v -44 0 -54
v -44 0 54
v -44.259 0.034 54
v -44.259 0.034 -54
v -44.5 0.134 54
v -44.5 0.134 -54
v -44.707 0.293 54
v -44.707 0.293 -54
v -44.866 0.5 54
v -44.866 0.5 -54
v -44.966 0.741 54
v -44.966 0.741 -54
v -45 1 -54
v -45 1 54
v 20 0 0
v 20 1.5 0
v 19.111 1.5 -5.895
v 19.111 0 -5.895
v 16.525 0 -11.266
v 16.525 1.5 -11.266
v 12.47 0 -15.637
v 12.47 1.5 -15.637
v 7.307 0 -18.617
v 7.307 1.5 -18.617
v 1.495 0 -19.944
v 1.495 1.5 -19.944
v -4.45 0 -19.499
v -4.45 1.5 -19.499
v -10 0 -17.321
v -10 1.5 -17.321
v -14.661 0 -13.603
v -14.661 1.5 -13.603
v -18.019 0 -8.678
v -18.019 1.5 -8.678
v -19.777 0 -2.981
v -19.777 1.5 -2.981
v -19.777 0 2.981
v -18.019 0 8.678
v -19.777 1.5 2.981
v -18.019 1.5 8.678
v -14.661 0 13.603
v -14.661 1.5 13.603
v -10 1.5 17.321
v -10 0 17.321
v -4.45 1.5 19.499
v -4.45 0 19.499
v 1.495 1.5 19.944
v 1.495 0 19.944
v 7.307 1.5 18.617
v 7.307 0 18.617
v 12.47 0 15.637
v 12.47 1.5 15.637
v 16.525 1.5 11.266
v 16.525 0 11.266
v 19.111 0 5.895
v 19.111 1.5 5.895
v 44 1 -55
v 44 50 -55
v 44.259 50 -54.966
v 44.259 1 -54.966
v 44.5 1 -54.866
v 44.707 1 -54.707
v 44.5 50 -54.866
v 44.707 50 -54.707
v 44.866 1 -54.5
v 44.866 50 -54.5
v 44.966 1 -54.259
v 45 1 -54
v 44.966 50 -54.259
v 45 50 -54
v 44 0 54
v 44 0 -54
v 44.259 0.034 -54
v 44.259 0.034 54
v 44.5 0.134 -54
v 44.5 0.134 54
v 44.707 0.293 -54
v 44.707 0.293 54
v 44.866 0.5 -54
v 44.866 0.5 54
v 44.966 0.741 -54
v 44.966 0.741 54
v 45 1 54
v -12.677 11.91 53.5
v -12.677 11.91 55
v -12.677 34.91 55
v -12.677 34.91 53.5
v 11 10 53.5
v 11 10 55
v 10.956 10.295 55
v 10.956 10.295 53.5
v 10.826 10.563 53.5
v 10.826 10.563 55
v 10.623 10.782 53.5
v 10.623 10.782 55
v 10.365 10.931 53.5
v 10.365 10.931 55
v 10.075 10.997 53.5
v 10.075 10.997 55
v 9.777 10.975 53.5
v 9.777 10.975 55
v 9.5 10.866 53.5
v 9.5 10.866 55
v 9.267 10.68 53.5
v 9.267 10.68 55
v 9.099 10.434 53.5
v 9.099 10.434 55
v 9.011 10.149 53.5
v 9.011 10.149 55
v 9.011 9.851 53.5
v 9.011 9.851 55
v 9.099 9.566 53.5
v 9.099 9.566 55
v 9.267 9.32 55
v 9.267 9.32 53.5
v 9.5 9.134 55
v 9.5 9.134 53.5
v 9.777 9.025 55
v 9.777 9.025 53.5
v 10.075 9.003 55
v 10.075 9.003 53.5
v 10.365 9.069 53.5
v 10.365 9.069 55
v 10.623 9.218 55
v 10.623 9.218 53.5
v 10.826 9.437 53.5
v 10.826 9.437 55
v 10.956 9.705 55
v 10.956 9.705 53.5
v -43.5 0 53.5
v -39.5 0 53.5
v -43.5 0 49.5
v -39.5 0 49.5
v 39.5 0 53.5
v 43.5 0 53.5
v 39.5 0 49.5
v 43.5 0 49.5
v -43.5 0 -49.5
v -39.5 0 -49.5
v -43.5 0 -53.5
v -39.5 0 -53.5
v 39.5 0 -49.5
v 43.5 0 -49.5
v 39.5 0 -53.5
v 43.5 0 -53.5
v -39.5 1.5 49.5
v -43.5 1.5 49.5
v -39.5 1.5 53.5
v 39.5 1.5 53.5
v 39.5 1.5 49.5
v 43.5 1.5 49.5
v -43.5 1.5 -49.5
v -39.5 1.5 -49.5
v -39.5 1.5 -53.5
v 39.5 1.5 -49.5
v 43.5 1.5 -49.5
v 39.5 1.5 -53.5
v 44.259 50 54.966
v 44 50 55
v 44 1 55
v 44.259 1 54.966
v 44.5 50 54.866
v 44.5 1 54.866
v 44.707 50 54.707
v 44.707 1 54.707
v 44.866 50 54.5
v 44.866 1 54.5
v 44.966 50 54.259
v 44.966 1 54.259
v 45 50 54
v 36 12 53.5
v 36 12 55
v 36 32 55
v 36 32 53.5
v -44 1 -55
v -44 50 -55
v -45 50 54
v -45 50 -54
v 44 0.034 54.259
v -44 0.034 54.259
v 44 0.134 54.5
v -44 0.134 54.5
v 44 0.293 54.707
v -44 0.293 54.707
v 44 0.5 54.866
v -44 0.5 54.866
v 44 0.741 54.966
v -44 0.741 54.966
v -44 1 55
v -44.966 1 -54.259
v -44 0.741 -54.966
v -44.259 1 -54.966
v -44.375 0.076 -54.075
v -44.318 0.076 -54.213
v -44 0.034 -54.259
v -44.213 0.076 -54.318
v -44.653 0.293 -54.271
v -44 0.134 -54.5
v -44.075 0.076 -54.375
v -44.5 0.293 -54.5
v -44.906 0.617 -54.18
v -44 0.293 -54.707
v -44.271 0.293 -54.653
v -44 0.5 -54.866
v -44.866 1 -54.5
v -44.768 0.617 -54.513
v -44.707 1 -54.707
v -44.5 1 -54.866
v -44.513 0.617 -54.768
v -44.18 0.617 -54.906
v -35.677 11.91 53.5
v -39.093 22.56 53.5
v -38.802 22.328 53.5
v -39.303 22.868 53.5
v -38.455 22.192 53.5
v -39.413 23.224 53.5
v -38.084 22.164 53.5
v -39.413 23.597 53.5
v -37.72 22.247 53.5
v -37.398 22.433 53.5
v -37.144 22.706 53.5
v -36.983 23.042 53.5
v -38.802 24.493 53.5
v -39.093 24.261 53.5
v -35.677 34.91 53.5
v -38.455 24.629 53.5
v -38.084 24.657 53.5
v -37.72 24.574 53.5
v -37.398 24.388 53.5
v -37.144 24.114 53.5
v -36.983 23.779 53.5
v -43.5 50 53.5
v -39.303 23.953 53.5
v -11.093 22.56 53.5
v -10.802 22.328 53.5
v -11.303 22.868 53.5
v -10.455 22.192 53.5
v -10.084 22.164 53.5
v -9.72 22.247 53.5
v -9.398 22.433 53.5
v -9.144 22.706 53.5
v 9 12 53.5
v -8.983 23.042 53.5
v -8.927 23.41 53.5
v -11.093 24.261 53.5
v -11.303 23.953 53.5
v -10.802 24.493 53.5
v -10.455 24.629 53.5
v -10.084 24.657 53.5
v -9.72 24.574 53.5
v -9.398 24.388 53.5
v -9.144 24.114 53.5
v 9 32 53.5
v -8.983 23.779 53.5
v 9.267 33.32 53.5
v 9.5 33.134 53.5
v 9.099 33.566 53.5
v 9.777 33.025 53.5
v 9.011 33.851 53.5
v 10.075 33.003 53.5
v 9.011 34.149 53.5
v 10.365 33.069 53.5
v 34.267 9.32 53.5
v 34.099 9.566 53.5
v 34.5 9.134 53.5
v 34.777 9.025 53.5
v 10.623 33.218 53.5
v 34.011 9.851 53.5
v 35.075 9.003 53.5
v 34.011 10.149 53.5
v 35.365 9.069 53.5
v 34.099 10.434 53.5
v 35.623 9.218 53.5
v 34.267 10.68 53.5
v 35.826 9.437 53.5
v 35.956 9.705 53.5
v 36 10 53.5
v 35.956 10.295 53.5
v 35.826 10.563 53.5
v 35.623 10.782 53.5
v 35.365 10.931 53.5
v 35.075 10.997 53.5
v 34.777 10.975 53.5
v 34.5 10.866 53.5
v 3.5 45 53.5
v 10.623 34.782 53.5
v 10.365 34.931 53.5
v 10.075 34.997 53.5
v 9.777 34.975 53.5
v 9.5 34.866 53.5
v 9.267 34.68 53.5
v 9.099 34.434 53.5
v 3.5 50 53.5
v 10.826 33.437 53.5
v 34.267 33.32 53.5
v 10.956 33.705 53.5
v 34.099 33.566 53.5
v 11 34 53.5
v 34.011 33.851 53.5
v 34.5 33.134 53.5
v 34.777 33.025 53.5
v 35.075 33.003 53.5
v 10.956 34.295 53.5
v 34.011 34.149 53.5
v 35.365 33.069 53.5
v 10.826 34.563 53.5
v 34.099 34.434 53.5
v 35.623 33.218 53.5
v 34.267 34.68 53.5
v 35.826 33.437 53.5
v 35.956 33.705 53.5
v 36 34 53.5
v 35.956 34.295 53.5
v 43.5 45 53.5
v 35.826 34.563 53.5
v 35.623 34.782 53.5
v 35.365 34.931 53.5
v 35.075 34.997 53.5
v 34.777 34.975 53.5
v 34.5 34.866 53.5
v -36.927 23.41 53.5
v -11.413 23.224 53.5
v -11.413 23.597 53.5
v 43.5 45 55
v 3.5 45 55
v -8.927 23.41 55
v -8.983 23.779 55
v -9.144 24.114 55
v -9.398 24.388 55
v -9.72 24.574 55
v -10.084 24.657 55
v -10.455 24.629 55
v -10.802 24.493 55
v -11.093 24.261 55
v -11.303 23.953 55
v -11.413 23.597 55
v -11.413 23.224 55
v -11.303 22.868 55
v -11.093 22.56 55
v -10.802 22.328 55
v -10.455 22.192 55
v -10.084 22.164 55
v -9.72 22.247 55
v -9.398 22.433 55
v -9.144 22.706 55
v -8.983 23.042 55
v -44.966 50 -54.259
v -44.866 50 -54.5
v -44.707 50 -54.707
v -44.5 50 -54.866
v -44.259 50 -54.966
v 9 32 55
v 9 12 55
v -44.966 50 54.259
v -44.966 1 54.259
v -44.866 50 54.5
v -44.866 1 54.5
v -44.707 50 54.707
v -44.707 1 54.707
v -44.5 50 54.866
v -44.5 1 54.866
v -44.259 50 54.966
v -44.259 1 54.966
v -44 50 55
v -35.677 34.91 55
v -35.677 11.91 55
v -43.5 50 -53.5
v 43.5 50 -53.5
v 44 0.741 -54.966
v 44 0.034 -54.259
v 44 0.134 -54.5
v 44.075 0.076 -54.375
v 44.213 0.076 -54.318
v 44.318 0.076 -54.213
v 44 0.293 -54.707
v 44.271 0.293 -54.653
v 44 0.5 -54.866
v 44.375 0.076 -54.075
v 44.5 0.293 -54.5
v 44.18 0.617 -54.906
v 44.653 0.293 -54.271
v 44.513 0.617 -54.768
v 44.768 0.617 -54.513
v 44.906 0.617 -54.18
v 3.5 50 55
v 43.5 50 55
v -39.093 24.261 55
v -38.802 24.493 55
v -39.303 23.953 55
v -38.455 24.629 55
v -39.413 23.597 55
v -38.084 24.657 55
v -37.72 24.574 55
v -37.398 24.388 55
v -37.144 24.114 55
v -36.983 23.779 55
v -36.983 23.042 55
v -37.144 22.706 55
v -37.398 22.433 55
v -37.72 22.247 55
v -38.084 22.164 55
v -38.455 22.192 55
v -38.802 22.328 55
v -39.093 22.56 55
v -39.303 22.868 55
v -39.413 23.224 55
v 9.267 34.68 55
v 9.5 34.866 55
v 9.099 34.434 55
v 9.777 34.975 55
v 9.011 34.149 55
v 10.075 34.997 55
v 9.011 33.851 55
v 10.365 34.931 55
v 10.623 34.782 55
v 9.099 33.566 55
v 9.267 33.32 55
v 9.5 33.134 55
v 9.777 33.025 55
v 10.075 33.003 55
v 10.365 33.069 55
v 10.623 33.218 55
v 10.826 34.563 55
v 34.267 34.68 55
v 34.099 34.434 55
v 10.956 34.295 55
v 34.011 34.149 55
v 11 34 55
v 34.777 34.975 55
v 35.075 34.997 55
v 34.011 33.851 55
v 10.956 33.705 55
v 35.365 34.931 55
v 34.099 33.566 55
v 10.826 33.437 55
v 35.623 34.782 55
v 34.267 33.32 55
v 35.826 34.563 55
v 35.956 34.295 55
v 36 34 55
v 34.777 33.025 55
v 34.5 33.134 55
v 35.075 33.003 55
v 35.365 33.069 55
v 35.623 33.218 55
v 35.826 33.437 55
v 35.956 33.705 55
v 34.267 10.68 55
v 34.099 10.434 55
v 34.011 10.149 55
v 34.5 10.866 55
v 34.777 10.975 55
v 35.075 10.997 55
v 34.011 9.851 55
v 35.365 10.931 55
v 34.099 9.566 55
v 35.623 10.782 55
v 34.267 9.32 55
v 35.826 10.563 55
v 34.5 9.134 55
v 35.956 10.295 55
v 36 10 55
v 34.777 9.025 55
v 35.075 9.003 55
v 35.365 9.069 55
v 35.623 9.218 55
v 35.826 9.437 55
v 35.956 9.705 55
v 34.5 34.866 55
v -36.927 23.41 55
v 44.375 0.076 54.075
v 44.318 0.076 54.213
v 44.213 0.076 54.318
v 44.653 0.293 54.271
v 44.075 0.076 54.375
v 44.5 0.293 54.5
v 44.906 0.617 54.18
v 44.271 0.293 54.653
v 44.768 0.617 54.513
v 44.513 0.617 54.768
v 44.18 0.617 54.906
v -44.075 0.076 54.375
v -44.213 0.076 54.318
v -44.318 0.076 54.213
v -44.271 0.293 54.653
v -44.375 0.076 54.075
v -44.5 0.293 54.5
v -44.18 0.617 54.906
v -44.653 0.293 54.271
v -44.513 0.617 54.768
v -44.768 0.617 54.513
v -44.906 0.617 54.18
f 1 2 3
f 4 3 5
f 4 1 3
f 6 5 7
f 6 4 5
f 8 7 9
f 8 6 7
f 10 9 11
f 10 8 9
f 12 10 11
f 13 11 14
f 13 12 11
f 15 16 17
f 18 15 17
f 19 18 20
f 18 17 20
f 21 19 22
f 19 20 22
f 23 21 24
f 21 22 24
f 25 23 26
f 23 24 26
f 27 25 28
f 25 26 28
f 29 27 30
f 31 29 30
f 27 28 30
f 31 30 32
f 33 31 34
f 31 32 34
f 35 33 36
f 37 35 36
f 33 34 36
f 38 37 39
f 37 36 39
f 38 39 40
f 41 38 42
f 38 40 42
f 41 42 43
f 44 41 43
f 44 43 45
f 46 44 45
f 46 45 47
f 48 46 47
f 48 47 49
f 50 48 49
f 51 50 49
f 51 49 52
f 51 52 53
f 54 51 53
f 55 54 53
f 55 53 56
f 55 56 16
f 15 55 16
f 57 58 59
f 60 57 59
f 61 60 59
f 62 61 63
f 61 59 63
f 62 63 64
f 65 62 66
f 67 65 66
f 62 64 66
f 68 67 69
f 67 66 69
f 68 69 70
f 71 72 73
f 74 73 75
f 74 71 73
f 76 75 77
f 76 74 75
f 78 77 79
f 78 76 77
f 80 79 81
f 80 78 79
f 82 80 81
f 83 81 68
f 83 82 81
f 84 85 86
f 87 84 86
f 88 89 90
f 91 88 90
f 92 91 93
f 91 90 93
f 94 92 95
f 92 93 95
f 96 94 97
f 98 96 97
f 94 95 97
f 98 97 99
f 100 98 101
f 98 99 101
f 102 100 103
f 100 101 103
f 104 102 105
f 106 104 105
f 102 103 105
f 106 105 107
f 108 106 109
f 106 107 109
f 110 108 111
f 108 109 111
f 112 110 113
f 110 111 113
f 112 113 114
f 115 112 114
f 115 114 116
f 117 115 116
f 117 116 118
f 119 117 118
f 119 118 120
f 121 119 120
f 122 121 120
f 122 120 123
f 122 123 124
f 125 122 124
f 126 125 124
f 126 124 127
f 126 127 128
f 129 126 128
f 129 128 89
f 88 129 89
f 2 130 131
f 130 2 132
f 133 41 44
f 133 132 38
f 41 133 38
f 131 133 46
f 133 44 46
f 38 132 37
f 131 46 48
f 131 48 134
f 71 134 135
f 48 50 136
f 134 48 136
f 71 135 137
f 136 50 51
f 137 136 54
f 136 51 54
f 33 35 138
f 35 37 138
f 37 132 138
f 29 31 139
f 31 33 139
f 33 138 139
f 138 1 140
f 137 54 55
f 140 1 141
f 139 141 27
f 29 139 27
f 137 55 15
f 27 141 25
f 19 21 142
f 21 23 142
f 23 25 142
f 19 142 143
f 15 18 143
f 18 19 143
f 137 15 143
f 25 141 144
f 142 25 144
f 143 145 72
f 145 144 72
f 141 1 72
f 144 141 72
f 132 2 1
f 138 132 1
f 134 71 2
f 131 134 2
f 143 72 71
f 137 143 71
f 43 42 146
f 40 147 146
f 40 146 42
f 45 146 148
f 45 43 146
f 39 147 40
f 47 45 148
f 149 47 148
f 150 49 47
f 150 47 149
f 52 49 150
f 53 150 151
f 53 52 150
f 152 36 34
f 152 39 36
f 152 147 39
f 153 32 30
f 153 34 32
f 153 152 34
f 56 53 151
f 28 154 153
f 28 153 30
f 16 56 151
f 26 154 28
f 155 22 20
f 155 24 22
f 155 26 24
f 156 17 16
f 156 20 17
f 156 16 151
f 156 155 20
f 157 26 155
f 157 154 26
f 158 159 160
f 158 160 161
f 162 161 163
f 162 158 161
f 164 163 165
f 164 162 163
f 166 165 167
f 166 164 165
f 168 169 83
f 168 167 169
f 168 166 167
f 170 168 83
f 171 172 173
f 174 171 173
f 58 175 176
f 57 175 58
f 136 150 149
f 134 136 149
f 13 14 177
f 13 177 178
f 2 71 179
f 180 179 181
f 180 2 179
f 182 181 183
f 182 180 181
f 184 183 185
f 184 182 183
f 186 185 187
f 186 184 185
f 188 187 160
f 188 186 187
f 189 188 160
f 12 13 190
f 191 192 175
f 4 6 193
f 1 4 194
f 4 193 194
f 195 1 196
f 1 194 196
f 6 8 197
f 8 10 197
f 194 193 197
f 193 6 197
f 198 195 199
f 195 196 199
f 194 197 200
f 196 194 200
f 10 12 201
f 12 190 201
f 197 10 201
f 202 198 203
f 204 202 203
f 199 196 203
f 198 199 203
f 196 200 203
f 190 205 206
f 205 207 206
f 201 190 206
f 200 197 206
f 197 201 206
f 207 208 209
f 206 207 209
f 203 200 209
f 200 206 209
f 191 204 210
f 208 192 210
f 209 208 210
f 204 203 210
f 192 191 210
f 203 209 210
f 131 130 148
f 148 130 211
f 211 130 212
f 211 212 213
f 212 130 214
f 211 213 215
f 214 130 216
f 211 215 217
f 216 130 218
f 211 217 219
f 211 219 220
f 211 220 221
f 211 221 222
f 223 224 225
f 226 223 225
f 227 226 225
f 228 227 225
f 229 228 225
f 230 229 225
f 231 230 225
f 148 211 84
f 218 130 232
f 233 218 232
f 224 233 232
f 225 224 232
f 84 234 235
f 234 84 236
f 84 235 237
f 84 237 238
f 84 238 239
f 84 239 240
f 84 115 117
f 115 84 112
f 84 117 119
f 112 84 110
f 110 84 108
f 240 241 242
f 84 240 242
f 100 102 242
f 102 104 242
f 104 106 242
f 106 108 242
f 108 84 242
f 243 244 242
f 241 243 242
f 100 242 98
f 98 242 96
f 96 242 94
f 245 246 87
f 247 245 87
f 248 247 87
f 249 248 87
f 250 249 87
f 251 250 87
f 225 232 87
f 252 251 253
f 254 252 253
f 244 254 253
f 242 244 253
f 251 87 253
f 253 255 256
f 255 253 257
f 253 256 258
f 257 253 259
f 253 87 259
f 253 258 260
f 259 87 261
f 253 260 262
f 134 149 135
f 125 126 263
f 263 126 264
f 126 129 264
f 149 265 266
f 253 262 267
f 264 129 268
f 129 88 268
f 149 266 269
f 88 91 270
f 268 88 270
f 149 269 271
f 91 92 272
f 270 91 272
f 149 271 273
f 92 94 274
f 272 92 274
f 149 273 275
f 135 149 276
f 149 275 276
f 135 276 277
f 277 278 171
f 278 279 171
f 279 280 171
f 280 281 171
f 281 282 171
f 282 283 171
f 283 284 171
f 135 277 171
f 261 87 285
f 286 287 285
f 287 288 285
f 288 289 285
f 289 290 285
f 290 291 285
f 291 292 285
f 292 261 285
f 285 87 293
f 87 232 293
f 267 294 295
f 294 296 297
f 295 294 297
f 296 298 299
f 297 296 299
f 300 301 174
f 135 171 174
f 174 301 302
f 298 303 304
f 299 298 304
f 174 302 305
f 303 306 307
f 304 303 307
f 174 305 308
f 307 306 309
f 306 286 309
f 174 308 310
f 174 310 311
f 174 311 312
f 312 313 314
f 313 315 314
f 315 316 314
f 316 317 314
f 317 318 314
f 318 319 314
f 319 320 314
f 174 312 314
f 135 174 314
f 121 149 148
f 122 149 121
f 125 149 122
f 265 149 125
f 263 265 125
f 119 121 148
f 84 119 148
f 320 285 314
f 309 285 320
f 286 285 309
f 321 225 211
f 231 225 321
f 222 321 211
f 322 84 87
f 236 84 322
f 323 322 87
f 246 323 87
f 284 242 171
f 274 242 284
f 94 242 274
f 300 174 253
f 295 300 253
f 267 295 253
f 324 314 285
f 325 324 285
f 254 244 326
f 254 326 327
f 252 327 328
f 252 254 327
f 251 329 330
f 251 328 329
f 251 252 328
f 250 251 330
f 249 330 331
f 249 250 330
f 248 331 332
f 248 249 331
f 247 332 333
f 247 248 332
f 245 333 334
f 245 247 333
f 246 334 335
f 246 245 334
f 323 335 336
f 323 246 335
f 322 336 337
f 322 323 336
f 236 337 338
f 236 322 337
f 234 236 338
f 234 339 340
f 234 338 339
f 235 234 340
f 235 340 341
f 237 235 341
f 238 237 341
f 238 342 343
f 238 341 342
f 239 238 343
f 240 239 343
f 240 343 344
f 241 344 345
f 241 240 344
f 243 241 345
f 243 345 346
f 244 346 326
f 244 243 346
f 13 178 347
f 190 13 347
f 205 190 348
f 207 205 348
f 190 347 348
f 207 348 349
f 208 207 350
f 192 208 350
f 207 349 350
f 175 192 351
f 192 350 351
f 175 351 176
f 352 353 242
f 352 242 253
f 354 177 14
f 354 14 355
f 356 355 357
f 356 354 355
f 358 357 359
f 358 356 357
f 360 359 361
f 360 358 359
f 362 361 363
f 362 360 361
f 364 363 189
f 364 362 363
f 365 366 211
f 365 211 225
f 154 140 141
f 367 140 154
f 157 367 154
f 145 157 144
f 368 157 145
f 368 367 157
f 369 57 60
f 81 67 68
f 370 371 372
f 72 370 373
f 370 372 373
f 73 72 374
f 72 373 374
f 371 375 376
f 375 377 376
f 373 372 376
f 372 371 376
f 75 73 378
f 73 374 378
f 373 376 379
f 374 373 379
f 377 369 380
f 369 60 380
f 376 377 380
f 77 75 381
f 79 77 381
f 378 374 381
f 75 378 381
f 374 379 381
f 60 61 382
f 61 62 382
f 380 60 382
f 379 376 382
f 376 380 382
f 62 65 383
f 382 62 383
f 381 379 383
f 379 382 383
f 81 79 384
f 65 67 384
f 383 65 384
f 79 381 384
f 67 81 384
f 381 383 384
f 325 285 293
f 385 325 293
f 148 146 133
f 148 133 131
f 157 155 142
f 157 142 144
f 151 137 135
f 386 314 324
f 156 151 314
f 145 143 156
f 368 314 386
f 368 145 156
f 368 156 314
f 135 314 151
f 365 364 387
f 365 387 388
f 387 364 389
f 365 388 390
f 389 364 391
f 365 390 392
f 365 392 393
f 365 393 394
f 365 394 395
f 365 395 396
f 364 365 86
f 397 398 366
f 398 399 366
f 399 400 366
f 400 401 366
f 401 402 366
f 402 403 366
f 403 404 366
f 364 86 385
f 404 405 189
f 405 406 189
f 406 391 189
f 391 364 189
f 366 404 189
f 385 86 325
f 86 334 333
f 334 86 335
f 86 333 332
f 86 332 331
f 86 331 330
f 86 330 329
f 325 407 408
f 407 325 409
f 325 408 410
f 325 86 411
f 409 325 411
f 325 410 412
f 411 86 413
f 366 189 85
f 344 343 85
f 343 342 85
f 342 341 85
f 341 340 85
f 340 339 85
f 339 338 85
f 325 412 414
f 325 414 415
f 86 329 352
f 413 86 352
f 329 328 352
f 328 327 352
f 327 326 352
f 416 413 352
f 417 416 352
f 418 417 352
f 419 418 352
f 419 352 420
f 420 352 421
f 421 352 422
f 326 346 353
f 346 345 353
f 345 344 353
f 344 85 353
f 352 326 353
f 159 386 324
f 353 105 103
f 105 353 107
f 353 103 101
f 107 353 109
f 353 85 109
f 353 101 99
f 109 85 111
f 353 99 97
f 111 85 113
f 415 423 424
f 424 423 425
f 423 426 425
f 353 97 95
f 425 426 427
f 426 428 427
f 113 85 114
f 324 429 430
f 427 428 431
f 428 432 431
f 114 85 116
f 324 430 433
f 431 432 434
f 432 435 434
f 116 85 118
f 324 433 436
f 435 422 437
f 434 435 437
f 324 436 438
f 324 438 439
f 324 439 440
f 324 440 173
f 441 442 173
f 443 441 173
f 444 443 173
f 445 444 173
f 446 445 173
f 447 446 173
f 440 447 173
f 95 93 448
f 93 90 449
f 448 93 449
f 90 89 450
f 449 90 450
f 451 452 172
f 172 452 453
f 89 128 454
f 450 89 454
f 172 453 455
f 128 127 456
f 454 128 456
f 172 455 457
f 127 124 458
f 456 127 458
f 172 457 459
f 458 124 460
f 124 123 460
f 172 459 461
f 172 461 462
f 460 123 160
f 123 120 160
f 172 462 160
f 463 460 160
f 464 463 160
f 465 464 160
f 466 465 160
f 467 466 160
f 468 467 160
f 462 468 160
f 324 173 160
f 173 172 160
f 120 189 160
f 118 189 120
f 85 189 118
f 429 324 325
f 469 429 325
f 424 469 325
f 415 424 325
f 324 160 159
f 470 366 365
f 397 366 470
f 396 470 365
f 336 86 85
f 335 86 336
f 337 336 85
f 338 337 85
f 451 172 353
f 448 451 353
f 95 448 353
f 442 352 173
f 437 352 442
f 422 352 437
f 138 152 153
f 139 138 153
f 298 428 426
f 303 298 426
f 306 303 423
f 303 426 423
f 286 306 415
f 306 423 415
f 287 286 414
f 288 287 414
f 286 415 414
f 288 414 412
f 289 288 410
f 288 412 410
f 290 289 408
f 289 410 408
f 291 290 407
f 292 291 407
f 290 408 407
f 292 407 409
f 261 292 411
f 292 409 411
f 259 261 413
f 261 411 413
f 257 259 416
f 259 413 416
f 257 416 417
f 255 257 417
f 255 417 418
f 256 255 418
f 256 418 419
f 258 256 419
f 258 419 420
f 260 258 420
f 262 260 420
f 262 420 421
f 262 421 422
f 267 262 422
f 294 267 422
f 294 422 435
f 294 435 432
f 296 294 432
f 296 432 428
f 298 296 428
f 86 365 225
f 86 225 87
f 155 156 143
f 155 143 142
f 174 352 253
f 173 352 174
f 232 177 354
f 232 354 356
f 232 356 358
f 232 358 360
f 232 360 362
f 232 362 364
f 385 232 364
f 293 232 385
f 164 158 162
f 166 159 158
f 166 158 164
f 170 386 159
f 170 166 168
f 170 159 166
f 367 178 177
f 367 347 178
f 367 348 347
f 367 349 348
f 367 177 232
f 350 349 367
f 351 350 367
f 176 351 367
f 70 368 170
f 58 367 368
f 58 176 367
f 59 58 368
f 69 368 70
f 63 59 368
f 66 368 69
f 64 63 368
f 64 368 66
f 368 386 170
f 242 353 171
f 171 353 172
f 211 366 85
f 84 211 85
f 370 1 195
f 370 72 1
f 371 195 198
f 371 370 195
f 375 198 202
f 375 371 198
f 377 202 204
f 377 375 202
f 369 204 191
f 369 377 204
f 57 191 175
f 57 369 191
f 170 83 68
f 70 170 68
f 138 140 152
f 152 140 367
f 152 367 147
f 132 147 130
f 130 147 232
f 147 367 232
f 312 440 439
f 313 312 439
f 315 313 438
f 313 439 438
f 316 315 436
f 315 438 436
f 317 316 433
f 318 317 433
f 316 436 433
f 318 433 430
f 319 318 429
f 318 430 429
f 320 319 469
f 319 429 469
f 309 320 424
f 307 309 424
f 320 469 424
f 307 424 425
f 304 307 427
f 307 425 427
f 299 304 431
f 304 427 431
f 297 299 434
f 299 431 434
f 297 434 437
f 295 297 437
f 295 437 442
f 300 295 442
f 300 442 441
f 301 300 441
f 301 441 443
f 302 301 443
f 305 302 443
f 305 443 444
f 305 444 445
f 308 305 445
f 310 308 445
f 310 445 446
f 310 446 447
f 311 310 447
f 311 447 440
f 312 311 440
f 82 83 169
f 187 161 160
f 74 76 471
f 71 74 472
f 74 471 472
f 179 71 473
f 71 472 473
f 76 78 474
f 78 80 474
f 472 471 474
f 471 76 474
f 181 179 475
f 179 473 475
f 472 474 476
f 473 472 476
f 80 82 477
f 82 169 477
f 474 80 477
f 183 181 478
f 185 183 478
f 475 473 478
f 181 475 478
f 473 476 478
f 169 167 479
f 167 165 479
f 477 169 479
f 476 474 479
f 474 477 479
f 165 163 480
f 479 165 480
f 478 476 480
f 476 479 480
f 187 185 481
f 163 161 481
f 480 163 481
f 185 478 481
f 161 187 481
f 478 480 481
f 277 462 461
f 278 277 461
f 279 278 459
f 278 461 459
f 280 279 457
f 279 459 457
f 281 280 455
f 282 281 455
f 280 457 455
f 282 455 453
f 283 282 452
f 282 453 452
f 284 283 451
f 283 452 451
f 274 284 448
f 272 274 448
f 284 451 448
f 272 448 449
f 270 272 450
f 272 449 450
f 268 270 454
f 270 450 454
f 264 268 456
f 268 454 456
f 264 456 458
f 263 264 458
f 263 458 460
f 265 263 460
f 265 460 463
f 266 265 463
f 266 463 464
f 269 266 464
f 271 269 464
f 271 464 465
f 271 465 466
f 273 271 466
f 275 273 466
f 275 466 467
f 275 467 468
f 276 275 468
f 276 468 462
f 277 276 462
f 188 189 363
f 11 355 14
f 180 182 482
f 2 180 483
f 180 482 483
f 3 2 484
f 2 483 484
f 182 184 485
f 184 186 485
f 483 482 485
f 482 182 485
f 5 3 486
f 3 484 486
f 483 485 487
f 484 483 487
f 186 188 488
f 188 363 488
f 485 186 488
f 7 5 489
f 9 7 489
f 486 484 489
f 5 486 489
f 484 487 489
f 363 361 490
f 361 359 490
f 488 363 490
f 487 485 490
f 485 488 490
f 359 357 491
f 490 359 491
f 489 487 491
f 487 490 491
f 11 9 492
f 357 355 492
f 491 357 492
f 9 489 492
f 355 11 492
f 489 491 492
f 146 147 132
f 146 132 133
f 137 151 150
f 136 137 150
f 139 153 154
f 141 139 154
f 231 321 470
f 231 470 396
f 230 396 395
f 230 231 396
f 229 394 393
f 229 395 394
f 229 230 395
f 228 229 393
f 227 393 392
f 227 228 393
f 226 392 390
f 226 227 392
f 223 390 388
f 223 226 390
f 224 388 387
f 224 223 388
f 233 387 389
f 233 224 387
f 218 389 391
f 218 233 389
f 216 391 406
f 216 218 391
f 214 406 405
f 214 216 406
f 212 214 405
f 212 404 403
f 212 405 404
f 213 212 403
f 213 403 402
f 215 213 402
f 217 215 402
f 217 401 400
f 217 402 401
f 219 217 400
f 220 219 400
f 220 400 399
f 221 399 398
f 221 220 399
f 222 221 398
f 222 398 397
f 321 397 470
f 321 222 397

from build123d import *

# Parameters (mm, degrees)
SKETCH_4_W               = 90
SKETCH_4_H               = 110
EXTRUDE_2_DEPTH          = 50
SHELL_2_T                = -1.5
SKETCH_5_W               = 4
SKETCH_5_H               = 4
CUT_EXTRUDE_2_DEPTH      = 50
MIRROR_5_COPY_1_SKETCH_W = 4
MIRROR_5_COPY_1_SKETCH_H = 4
MIRROR_5_COPY_1_DEPTH    = 50
SKETCH_9_R               = 20
CUT_EXTRUDE_5_DEPTH      = 50
SKETCH_12_W              = 23
SKETCH_12_H              = 23
CUT_EXTRUDE_6_DEPTH      = 50
SKETCH_15_R              = 1.25
CUT_EXTRUDE_8_DEPTH      = 129
SKETCH_16_W              = 27
SKETCH_16_H              = 20
CUT_EXTRUDE_9_DEPTH      = 50
SKETCH_17_R              = 1
CUT_EXTRUDE_10_DEPTH     = 50
SKETCH_19_R              = 1
CUT_EXTRUDE_11_DEPTH     = 50
SKETCH_21_R              = 1
CUT_EXTRUDE_12_DEPTH     = 50
SKETCH_22_R              = 1
CUT_EXTRUDE_13_DEPTH     = 50
FILLET_1_R               = 1
FILLET_2_R               = 1
SKETCH_25_W              = 40
SKETCH_25_H              = 5
CUT_EXTRUDE_15_DEPTH     = 50


with BuildPart() as part:
    # 草图4 → 凸台-拉伸2 (new body)
    with BuildSketch(Plane(origin=(0, 0, 0), x_dir=(1, 0, 0), z_dir=(0, 1, 0))):
        Rectangle(SKETCH_4_W, SKETCH_4_H)
    extrude(amount=EXTRUDE_2_DEPTH)

    # 抽壳2
    shell_2_openings = [part.faces().sort_by_distance(p)[0] for p in [
        (0, 50, 0),
    ]]
    offset(amount=SHELL_2_T, openings=shell_2_openings, kind=Kind.INTERSECTION)

    # 草图5 → 切除-拉伸2 (cut)
    with BuildSketch(Plane(origin=(0, 1.5, 0), x_dir=(1, 0, 0), z_dir=(0, 1, 0))):
        with Locations((-41.5, 51.5)):
            Rectangle(SKETCH_5_W, SKETCH_5_H)
    cut_extrude_2 = extrude(amount=-CUT_EXTRUDE_2_DEPTH, mode=Mode.SUBTRACT)

    # 镜向4: 切除-拉伸2 across plane
    add(cut_extrude_2.mirror(Plane.XY), mode=Mode.SUBTRACT)

    # 镜向5: 切除-拉伸2 across plane
    add(cut_extrude_2.mirror(Plane(origin=(0, 0, 0), x_dir=(0, 0, 1), z_dir=(1, 0, 0))), mode=Mode.SUBTRACT)

    # 镜向5 copy 1 sketch → 镜向5 copy 1 (cut)
    with BuildSketch(Plane(origin=(0, 1.5, 0), x_dir=(-1, 0, 0), z_dir=(0, 1, 0))):
        with Locations((-41.5, 51.5)):
            Rectangle(MIRROR_5_COPY_1_SKETCH_W, MIRROR_5_COPY_1_SKETCH_H)
    extrude(amount=-MIRROR_5_COPY_1_DEPTH, mode=Mode.SUBTRACT)

    # 草图9 → 切除-拉伸5 (cut)
    with BuildSketch(Plane(origin=(0, 1.5, 0), x_dir=(1, 0, 0), z_dir=(0, 1, 0))):
        Circle(SKETCH_9_R)
    extrude(amount=-CUT_EXTRUDE_5_DEPTH, mode=Mode.SUBTRACT)

    # 草图12 → 切除-拉伸6 (cut)
    with BuildSketch(Plane.XY.offset(55)):
        with Locations((-24.177084585, 23.410301274)):
            Rectangle(SKETCH_12_W, SKETCH_12_H)
    extrude(amount=-CUT_EXTRUDE_6_DEPTH, mode=Mode.SUBTRACT)

    # 草图15 → 切除-拉伸8 (cut)
    with BuildSketch(Plane.XY.offset(-53.5)):
        with Locations((-10.177084585, 23.410301274)):
            Circle(SKETCH_15_R)
        with Locations((-38.177084585, 23.410301274)):
            Circle(SKETCH_15_R)
    extrude(amount=CUT_EXTRUDE_8_DEPTH, mode=Mode.SUBTRACT)

    # 草图16 → 切除-拉伸9 (cut)
    with BuildSketch(Plane.XY.offset(55)):
        with Locations((22.5, 22)):
            Rectangle(SKETCH_16_W, SKETCH_16_H)
    extrude(amount=-CUT_EXTRUDE_9_DEPTH, mode=Mode.SUBTRACT)

    # 草图17 → 切除-拉伸10 (cut)
    with BuildSketch(Plane.XY.offset(55)):
        with Locations((35, 34)):
            Circle(SKETCH_17_R)
    extrude(amount=-CUT_EXTRUDE_10_DEPTH, mode=Mode.SUBTRACT)

    # 草图19 → 切除-拉伸11 (cut)
    with BuildSketch(Plane.XY.offset(55)):
        with Locations((35, 10)):
            Circle(SKETCH_19_R)
    extrude(amount=-CUT_EXTRUDE_11_DEPTH, mode=Mode.SUBTRACT)

    # 草图21 → 切除-拉伸12 (cut)
    with BuildSketch(Plane.XY.offset(55)):
        with Locations((10, 34)):
            Circle(SKETCH_21_R)
    extrude(amount=-CUT_EXTRUDE_12_DEPTH, mode=Mode.SUBTRACT)

    # 草图22 → 切除-拉伸13 (cut)
    with BuildSketch(Plane.XY.offset(55)):
        with Locations((10, 10)):
            Circle(SKETCH_22_R)
    extrude(amount=-CUT_EXTRUDE_13_DEPTH, mode=Mode.SUBTRACT)

    # 圆角1
    fillet_1_edges = [part.edges().sort_by_distance(p)[0] for p in [
        (-45, 25, -55),
        (45, 25, -55),
        (45, 25, 55),
        (-45, 25, 55),
    ]]
    fillet(fillet_1_edges, radius=FILLET_1_R)

    # 圆角2
    fillet_2_edges = [part.edges().sort_by_distance(p)[0] for p in [
        (0, 0, -55),
        (-45, 0, 0),
        (45, 0, 0),
        (0, 0, 55),
        (44.707106781, 0, 54.707106781),
        (-44.707106781, 0, 54.707106781),
        (-44.707106781, 0, -54.707106781),
        (44.707106781, 0, -54.707106781),
    ]]
    fillet(fillet_2_edges, radius=FILLET_2_R)

    # 草图25 → 切除-拉伸15 (cut)
    with BuildSketch(Plane(origin=(0, 0, 53.5), x_dir=(-1, 0, 0), z_dir=(0, 0, -1))):
        with Locations((-23.5, 47.5)):
            Rectangle(SKETCH_25_W, SKETCH_25_H)
    extrude(amount=-CUT_EXTRUDE_15_DEPTH, mode=Mode.SUBTRACT)


solid = part.part
